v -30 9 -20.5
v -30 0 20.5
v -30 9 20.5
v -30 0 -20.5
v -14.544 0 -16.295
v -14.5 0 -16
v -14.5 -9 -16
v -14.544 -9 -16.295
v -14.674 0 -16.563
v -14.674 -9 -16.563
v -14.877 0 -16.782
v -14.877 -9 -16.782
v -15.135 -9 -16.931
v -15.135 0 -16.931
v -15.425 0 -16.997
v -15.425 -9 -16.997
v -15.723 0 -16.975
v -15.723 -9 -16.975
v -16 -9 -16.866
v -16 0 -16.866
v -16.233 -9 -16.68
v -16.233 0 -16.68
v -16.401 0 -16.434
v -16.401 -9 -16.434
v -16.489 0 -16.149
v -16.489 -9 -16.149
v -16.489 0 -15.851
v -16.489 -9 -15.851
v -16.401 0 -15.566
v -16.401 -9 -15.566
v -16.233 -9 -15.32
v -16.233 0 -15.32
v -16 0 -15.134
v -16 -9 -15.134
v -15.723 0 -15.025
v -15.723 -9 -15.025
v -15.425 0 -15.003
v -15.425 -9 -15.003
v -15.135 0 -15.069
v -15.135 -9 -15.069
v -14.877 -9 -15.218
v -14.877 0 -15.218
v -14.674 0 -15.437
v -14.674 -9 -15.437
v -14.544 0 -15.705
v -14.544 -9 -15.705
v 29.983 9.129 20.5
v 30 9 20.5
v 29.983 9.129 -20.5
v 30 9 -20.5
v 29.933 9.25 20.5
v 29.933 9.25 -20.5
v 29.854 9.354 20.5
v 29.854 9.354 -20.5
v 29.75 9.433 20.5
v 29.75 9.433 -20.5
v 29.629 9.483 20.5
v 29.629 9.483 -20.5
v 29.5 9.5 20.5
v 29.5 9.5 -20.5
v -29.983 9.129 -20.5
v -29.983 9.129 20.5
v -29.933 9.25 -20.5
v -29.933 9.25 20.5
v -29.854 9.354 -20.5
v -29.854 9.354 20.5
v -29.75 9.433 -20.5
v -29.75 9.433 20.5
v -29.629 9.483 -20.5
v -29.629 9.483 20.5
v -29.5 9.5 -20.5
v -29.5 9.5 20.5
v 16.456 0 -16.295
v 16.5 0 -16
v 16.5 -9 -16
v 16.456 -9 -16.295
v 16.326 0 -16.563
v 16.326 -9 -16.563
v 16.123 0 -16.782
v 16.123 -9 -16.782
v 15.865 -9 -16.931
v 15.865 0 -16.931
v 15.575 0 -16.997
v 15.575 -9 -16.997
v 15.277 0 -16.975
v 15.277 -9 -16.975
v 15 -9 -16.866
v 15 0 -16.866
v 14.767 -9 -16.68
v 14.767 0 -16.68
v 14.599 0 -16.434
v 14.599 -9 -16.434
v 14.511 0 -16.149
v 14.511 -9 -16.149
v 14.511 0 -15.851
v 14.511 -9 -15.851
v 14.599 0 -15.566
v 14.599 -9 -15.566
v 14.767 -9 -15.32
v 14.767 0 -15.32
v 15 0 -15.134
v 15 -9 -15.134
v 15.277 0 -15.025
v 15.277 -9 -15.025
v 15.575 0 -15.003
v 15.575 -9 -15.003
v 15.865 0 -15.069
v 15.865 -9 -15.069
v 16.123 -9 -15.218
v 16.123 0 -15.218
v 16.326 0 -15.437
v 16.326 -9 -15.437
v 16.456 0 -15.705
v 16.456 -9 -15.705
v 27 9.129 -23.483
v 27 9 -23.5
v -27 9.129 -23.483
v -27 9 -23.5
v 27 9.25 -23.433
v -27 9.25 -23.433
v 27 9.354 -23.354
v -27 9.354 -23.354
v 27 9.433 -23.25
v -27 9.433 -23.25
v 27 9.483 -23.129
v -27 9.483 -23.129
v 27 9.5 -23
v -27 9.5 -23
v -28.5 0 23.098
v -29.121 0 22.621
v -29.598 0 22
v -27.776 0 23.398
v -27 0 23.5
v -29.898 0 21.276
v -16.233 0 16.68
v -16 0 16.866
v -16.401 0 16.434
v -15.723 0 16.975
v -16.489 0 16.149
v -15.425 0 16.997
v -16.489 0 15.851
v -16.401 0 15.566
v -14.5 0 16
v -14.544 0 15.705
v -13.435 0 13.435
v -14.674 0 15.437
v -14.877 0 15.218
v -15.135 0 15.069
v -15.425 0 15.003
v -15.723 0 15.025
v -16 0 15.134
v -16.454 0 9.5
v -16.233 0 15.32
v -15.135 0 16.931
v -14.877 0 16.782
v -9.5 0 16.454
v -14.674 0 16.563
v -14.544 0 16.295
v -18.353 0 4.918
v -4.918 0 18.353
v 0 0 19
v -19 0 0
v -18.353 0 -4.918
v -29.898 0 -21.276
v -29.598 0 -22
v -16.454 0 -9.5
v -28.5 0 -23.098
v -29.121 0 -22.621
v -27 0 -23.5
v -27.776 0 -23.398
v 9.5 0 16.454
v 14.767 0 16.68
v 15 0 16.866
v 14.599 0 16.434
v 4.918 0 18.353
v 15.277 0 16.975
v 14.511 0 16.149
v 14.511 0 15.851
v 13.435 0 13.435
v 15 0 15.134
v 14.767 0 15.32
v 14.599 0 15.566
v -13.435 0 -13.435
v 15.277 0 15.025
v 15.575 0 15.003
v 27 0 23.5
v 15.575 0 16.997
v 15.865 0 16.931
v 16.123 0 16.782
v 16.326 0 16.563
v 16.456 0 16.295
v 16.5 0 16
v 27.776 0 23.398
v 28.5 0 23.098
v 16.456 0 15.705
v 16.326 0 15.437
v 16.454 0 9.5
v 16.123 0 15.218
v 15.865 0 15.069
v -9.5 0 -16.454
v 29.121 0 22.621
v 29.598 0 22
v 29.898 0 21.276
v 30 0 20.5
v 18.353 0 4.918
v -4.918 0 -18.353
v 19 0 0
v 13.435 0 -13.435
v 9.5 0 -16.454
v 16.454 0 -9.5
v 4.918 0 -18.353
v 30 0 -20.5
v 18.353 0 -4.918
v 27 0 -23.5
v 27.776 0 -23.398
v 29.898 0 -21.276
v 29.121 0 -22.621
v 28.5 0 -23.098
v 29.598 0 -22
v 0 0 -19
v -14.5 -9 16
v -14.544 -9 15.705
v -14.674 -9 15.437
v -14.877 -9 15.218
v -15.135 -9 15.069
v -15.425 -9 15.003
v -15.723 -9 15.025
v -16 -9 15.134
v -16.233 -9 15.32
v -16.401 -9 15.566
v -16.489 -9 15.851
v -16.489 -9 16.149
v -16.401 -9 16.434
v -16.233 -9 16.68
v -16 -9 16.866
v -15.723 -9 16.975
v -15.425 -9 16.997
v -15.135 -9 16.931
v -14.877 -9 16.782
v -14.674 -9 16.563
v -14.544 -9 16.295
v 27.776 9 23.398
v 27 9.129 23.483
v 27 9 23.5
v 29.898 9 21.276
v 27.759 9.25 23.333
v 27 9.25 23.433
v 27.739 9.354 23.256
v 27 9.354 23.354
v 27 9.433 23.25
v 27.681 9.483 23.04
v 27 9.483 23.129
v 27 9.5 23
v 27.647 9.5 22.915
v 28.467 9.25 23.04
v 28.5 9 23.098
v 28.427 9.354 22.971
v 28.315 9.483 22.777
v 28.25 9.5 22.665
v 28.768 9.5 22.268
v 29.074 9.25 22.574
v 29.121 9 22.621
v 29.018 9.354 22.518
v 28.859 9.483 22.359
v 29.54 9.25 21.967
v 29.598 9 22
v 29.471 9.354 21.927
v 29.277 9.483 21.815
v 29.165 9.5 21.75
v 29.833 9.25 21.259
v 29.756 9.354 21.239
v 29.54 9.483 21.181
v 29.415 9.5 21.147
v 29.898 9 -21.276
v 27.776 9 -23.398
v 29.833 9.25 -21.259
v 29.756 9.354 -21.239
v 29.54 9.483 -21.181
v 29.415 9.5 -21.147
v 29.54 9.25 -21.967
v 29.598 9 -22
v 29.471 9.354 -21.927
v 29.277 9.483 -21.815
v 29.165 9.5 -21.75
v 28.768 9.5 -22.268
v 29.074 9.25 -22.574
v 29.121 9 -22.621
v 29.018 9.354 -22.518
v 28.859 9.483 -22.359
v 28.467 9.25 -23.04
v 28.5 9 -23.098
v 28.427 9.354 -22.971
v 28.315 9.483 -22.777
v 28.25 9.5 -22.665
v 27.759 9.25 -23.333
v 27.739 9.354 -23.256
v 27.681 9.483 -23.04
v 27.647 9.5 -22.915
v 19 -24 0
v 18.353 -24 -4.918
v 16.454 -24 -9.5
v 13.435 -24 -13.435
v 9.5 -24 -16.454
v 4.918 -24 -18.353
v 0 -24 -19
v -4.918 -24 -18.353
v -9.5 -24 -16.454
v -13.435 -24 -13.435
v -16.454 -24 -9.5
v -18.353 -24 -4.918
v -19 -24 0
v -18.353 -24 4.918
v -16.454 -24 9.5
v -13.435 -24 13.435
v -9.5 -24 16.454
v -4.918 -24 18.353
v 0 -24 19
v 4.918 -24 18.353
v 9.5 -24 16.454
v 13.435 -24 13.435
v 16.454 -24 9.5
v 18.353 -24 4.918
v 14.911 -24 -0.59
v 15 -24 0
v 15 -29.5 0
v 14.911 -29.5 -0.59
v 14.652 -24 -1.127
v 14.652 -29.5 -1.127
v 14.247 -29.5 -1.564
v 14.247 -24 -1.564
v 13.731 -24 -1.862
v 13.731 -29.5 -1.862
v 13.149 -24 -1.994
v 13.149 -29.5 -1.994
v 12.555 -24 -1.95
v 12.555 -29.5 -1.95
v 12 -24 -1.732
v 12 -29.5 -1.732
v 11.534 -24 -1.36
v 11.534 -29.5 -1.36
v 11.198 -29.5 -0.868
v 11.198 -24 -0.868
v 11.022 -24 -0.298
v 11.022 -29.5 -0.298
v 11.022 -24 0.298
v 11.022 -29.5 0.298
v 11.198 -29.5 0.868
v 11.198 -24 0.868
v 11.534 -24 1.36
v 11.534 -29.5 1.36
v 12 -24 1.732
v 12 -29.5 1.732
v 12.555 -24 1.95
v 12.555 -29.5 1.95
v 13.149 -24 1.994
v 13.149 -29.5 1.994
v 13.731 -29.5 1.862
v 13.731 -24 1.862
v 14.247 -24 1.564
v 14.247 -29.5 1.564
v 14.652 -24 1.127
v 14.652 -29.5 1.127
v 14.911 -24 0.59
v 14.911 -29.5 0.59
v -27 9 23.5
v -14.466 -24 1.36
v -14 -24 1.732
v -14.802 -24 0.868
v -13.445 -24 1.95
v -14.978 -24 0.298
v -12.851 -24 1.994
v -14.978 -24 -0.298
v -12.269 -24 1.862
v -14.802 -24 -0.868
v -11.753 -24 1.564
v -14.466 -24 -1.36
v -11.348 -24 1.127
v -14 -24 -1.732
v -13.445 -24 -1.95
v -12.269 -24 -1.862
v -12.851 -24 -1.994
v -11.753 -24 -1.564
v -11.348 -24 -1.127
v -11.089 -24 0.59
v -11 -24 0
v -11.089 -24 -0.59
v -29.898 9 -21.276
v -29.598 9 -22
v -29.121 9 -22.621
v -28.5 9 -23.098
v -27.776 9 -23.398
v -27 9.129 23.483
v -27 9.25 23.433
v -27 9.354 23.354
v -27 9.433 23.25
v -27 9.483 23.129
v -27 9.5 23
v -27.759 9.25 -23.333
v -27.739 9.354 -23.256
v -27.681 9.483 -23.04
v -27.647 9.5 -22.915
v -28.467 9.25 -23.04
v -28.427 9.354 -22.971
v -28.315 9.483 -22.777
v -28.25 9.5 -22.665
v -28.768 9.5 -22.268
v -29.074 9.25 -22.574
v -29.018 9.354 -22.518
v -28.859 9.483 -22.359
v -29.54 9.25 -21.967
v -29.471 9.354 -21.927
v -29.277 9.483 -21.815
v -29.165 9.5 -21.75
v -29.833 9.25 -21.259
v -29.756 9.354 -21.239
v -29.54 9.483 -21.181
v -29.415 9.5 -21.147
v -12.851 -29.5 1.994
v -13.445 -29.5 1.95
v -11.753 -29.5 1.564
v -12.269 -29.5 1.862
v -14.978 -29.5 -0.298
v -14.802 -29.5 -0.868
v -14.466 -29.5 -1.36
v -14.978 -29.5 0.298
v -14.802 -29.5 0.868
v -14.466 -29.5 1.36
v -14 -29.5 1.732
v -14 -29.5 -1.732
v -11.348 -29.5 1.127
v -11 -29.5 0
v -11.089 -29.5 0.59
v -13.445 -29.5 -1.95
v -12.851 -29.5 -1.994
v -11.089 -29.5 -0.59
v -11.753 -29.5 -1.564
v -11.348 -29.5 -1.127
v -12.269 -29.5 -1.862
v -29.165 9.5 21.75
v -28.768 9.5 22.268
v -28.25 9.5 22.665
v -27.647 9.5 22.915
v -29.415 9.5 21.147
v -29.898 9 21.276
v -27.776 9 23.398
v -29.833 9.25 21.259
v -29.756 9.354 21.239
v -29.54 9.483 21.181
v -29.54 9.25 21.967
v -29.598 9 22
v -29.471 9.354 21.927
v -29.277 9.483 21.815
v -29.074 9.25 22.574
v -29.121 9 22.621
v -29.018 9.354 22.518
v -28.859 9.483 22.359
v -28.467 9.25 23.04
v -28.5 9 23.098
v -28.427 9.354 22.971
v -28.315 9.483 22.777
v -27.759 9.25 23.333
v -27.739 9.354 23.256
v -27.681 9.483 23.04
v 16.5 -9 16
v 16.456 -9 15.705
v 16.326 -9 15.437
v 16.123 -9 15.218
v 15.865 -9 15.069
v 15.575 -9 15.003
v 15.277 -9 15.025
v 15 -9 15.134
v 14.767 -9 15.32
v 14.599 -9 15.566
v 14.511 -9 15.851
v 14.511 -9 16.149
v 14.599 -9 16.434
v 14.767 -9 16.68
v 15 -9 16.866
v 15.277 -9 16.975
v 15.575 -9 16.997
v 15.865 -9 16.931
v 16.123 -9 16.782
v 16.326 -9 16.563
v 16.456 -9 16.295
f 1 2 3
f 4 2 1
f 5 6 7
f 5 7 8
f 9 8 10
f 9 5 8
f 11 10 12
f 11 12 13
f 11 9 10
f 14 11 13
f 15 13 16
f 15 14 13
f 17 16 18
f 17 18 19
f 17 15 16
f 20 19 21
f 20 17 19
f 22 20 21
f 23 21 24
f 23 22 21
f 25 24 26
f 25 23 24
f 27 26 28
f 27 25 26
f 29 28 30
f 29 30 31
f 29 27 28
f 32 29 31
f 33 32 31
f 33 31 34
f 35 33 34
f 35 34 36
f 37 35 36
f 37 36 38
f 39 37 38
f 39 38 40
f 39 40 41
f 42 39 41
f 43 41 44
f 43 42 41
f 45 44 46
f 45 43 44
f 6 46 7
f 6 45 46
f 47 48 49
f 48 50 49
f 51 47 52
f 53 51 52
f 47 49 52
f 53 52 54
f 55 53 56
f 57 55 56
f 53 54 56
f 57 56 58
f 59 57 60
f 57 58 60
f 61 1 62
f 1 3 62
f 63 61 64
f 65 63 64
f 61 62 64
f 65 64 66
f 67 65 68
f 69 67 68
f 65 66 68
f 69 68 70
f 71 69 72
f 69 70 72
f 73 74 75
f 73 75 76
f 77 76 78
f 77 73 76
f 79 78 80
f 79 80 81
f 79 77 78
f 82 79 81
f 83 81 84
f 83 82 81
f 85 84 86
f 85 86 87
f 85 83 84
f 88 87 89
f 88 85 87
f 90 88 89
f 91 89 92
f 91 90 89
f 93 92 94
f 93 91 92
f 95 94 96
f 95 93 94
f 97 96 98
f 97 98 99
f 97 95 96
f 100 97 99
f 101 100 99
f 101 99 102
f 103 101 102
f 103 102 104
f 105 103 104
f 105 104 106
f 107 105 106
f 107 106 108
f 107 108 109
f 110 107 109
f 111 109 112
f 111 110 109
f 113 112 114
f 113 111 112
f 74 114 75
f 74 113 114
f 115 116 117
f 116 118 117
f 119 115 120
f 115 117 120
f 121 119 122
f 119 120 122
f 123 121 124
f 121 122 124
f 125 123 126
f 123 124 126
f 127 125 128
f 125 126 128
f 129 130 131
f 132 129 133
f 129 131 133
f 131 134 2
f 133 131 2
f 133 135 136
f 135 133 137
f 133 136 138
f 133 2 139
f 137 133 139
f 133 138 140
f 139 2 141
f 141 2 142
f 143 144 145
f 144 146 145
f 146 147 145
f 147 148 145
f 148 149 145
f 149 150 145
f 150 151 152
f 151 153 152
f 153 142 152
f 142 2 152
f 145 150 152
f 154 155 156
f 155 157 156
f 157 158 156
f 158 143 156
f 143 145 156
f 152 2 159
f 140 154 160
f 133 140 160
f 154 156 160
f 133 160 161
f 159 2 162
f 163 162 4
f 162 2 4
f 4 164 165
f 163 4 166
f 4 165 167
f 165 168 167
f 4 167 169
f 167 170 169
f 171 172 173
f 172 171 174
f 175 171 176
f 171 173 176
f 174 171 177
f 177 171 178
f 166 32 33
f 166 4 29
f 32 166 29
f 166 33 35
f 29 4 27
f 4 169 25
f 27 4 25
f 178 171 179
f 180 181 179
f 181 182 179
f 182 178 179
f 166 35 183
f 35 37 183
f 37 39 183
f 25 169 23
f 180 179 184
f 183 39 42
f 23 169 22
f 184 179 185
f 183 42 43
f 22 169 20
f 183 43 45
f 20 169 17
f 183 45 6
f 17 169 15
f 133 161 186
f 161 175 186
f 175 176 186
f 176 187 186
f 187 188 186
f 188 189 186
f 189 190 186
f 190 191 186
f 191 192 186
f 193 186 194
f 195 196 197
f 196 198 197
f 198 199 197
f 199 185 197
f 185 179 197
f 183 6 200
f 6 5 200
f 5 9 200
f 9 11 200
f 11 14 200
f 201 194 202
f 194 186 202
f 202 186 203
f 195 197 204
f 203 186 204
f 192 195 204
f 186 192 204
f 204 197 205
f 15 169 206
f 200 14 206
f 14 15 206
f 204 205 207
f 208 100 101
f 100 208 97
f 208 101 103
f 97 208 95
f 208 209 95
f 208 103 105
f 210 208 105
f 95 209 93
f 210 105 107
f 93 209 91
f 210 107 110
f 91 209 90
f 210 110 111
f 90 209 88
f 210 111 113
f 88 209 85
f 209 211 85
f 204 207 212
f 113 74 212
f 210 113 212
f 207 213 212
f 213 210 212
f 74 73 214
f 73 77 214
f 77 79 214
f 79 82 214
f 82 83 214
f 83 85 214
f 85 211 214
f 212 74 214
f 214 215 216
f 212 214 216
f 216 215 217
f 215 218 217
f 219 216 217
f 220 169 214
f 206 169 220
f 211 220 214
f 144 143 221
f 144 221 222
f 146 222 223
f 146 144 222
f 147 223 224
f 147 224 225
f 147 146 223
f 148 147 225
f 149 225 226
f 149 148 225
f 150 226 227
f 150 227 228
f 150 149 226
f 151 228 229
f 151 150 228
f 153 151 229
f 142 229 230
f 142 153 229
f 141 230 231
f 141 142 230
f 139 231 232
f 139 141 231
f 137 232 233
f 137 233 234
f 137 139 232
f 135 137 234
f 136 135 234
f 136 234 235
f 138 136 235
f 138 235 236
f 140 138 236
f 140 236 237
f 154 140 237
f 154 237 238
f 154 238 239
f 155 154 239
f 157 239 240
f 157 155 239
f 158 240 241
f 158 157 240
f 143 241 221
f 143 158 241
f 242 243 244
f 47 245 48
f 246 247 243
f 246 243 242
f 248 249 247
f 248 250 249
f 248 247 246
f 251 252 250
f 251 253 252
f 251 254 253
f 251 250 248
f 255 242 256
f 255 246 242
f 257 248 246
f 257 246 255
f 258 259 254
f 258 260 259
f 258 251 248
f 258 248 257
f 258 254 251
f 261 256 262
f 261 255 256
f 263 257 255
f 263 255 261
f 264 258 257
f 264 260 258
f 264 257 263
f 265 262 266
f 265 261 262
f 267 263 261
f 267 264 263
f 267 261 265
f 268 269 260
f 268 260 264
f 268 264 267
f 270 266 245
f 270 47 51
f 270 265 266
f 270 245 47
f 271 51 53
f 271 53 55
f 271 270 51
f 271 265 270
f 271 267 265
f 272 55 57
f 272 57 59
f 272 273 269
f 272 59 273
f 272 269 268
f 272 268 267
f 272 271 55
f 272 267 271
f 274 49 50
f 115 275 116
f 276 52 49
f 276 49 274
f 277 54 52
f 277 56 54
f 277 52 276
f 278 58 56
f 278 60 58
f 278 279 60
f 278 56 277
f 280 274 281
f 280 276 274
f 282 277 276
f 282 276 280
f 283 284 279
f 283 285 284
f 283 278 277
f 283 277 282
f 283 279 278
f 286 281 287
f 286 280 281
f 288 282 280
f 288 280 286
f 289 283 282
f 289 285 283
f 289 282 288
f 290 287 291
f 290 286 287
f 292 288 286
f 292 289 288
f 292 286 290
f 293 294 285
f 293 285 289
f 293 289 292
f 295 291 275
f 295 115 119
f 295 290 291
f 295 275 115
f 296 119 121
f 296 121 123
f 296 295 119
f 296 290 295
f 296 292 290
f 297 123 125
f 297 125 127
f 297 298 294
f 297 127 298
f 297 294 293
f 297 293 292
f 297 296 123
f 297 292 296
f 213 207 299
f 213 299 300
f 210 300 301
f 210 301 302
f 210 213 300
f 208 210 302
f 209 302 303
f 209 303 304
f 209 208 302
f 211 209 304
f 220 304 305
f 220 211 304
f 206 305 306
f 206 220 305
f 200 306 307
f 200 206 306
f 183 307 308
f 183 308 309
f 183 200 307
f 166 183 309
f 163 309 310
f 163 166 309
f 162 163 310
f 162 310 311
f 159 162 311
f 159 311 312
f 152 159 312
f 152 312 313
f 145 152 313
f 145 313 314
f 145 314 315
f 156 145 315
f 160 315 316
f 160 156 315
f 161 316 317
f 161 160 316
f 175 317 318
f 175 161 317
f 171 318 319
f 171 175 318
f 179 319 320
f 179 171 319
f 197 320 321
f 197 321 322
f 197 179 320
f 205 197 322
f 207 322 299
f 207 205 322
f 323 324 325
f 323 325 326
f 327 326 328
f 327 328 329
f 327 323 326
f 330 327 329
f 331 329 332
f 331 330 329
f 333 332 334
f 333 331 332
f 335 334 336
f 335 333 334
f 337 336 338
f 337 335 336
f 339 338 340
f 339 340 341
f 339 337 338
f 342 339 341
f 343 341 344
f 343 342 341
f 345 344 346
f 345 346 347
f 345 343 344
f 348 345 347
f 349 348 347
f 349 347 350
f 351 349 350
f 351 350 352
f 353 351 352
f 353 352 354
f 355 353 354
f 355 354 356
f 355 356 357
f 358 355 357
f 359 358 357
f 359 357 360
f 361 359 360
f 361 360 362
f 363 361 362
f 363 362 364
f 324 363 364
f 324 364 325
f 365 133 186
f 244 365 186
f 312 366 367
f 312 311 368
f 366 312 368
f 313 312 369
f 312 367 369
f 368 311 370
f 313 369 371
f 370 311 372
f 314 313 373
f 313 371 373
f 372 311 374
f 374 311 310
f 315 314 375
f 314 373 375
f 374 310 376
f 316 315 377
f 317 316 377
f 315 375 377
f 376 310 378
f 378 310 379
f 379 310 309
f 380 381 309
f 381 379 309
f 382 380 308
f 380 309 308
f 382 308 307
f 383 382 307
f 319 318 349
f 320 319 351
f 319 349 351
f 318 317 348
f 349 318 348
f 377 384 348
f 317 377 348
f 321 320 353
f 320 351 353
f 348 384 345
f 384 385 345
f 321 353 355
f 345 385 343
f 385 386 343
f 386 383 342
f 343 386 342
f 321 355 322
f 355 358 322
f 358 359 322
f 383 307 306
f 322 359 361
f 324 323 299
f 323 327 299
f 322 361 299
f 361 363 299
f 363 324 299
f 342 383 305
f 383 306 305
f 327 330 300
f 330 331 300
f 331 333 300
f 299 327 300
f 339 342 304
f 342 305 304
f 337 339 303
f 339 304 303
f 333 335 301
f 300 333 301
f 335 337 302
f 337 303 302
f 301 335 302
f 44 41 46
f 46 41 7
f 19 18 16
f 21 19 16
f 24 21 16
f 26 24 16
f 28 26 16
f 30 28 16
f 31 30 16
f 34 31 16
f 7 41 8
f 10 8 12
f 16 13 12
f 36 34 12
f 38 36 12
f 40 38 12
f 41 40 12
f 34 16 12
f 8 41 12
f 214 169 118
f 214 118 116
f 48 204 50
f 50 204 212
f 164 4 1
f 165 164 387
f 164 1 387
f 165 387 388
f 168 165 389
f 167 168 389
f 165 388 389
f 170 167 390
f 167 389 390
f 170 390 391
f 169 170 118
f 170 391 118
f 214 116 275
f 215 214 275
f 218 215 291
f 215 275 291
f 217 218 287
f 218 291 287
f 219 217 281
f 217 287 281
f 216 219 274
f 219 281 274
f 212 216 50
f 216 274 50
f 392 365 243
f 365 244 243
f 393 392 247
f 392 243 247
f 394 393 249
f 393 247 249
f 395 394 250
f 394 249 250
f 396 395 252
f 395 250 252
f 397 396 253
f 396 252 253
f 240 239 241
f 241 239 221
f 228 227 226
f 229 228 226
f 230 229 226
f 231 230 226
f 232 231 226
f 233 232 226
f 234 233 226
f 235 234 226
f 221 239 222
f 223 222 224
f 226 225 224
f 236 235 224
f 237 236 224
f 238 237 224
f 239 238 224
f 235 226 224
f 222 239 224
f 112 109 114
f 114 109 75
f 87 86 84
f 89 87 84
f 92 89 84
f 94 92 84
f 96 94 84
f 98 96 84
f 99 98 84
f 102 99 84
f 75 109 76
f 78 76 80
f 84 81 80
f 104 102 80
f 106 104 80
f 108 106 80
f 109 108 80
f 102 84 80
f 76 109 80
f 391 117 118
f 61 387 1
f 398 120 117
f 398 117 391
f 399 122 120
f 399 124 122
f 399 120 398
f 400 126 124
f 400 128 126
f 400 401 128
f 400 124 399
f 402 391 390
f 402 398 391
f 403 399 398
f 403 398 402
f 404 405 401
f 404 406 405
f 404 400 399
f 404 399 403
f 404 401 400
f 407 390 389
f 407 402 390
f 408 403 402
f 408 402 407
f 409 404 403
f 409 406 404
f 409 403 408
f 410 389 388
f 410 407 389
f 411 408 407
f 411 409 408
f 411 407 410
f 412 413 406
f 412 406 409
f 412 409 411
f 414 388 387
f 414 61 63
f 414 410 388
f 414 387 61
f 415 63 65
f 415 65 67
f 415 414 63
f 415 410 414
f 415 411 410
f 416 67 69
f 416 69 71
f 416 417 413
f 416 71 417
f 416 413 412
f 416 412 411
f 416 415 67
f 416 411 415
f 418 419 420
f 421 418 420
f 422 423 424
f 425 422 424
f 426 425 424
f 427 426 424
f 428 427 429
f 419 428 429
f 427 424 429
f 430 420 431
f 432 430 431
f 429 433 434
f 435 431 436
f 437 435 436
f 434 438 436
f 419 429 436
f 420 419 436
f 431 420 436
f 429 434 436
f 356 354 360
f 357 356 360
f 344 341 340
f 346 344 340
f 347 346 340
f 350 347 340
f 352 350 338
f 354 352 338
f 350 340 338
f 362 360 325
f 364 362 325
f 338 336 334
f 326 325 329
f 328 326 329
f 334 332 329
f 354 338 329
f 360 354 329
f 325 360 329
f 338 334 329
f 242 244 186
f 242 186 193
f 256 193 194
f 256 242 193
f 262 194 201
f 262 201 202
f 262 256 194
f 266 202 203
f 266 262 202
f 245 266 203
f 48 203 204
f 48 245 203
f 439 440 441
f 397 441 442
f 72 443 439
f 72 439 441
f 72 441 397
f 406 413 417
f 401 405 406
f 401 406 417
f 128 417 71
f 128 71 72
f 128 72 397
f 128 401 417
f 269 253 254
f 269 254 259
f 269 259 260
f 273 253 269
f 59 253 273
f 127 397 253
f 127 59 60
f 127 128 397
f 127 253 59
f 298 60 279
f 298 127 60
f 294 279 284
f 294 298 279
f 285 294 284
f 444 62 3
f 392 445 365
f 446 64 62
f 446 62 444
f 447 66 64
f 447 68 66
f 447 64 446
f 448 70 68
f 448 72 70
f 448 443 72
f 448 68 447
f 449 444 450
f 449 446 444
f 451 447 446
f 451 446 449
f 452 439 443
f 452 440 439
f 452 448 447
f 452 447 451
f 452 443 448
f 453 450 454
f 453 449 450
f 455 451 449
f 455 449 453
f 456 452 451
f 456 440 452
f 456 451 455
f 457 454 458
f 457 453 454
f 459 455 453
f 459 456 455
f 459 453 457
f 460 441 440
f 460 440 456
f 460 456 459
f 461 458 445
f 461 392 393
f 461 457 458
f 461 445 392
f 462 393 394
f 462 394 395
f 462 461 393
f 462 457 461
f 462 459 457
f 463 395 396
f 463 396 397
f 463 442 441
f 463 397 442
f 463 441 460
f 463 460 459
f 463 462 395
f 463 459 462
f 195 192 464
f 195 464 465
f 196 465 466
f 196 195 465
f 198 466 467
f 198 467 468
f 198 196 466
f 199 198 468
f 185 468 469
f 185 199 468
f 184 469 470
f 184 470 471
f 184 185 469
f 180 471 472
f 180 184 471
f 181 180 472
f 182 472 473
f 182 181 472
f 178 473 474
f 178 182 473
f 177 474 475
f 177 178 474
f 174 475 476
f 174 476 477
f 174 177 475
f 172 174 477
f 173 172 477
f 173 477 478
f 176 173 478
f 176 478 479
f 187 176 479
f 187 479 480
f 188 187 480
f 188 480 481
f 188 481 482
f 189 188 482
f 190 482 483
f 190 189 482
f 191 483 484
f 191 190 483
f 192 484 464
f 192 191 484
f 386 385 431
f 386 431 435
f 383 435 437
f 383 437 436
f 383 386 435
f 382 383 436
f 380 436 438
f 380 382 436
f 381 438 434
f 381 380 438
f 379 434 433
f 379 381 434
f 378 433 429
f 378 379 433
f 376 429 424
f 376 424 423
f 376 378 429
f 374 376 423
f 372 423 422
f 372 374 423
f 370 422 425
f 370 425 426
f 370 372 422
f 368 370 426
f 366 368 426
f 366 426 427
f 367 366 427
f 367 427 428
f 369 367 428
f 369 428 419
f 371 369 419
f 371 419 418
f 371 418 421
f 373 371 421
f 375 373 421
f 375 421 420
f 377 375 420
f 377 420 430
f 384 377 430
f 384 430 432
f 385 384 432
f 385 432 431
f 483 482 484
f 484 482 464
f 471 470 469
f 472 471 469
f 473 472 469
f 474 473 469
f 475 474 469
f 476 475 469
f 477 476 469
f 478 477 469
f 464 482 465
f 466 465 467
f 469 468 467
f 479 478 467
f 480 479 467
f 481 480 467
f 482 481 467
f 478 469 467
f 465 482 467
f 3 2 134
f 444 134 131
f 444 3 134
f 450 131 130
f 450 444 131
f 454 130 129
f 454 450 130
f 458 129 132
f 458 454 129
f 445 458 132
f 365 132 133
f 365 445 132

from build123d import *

# Parameters (mm, degrees)
SKETCH1_W           = 60
SKETCH1_H           = 47
BOSS_EXTRUDE1_DEPTH = 9.5
SKETCH1_3_R         = 1
BOSS_EXTRUDE2_DEPTH = 9
SKETCH1_4_R         = 2
BOSS_EXTRUDE3_DEPTH = 29.5
SKETCH1_5_R         = 19
BOSS_EXTRUDE4_DEPTH = 24
FILLET1_R           = 3
FILLET2_R           = 0.5


with BuildPart() as part:
    # Sketch1 → Boss-Extrude1 (new body)
    with BuildSketch(Plane(origin=(0, 0, 0), x_dir=(1, 0, 0), z_dir=(0, 1, 0))):
        Rectangle(SKETCH1_W, SKETCH1_H)
    extrude(amount=BOSS_EXTRUDE1_DEPTH)

    # Sketch1<3> → Boss-Extrude2 (add)
    with BuildSketch(Plane(origin=(0, 0, 0), x_dir=(1, 0, 0), z_dir=(0, 1, 0))):
        with Locations((-15.5, 16)):
            Circle(SKETCH1_3_R)
        with Locations((15.5, 16)):
            Circle(SKETCH1_3_R)
        with Locations((15.5, -16)):
            Circle(SKETCH1_3_R)
        with Locations((-15.5, -16)):
            Circle(SKETCH1_3_R)
    extrude(amount=-BOSS_EXTRUDE2_DEPTH)

    # Sketch1<4> → Boss-Extrude3 (add)
    with BuildSketch(Plane(origin=(0, 0, 0), x_dir=(1, 0, 0), z_dir=(0, 1, 0))):
        with Locations((13, 0)):
            Circle(SKETCH1_4_R)
        with Locations((-13, 0)):
            Circle(SKETCH1_4_R)
    extrude(amount=-BOSS_EXTRUDE3_DEPTH)

    # Sketch1<5> → Boss-Extrude4 (add)
    with BuildSketch(Plane(origin=(0, 0, 0), x_dir=(1, 0, 0), z_dir=(0, 1, 0))):
        Circle(SKETCH1_5_R)
    extrude(amount=-BOSS_EXTRUDE4_DEPTH)

    # Fillet1
    fillet1_edges = [part.edges().sort_by_distance(p)[0] for p in [
        (-30, 4.75, 23.5),
        (30, 4.75, 23.5),
        (30, 4.75, -23.5),
        (-30, 4.75, -23.5),
    ]]
    fillet(fillet1_edges, radius=FILLET1_R)

    # Fillet2
    fillet2_edges = [part.edges().sort_by_distance(p)[0] for p in [
        (0, 9.5, 23.5),
        (-30, 9.5, 0),
        (30, 9.5, 0),
        (0, 9.5, -23.5),
        (29.121320344, 9.5, -22.621320344),
        (-29.121320344, 9.5, -22.621320344),
        (29.121320344, 9.5, 22.621320344),
        (-29.121320344, 9.5, 22.621320344),
    ]]
    fillet(fillet2_edges, radius=FILLET2_R)


solid = part.part
